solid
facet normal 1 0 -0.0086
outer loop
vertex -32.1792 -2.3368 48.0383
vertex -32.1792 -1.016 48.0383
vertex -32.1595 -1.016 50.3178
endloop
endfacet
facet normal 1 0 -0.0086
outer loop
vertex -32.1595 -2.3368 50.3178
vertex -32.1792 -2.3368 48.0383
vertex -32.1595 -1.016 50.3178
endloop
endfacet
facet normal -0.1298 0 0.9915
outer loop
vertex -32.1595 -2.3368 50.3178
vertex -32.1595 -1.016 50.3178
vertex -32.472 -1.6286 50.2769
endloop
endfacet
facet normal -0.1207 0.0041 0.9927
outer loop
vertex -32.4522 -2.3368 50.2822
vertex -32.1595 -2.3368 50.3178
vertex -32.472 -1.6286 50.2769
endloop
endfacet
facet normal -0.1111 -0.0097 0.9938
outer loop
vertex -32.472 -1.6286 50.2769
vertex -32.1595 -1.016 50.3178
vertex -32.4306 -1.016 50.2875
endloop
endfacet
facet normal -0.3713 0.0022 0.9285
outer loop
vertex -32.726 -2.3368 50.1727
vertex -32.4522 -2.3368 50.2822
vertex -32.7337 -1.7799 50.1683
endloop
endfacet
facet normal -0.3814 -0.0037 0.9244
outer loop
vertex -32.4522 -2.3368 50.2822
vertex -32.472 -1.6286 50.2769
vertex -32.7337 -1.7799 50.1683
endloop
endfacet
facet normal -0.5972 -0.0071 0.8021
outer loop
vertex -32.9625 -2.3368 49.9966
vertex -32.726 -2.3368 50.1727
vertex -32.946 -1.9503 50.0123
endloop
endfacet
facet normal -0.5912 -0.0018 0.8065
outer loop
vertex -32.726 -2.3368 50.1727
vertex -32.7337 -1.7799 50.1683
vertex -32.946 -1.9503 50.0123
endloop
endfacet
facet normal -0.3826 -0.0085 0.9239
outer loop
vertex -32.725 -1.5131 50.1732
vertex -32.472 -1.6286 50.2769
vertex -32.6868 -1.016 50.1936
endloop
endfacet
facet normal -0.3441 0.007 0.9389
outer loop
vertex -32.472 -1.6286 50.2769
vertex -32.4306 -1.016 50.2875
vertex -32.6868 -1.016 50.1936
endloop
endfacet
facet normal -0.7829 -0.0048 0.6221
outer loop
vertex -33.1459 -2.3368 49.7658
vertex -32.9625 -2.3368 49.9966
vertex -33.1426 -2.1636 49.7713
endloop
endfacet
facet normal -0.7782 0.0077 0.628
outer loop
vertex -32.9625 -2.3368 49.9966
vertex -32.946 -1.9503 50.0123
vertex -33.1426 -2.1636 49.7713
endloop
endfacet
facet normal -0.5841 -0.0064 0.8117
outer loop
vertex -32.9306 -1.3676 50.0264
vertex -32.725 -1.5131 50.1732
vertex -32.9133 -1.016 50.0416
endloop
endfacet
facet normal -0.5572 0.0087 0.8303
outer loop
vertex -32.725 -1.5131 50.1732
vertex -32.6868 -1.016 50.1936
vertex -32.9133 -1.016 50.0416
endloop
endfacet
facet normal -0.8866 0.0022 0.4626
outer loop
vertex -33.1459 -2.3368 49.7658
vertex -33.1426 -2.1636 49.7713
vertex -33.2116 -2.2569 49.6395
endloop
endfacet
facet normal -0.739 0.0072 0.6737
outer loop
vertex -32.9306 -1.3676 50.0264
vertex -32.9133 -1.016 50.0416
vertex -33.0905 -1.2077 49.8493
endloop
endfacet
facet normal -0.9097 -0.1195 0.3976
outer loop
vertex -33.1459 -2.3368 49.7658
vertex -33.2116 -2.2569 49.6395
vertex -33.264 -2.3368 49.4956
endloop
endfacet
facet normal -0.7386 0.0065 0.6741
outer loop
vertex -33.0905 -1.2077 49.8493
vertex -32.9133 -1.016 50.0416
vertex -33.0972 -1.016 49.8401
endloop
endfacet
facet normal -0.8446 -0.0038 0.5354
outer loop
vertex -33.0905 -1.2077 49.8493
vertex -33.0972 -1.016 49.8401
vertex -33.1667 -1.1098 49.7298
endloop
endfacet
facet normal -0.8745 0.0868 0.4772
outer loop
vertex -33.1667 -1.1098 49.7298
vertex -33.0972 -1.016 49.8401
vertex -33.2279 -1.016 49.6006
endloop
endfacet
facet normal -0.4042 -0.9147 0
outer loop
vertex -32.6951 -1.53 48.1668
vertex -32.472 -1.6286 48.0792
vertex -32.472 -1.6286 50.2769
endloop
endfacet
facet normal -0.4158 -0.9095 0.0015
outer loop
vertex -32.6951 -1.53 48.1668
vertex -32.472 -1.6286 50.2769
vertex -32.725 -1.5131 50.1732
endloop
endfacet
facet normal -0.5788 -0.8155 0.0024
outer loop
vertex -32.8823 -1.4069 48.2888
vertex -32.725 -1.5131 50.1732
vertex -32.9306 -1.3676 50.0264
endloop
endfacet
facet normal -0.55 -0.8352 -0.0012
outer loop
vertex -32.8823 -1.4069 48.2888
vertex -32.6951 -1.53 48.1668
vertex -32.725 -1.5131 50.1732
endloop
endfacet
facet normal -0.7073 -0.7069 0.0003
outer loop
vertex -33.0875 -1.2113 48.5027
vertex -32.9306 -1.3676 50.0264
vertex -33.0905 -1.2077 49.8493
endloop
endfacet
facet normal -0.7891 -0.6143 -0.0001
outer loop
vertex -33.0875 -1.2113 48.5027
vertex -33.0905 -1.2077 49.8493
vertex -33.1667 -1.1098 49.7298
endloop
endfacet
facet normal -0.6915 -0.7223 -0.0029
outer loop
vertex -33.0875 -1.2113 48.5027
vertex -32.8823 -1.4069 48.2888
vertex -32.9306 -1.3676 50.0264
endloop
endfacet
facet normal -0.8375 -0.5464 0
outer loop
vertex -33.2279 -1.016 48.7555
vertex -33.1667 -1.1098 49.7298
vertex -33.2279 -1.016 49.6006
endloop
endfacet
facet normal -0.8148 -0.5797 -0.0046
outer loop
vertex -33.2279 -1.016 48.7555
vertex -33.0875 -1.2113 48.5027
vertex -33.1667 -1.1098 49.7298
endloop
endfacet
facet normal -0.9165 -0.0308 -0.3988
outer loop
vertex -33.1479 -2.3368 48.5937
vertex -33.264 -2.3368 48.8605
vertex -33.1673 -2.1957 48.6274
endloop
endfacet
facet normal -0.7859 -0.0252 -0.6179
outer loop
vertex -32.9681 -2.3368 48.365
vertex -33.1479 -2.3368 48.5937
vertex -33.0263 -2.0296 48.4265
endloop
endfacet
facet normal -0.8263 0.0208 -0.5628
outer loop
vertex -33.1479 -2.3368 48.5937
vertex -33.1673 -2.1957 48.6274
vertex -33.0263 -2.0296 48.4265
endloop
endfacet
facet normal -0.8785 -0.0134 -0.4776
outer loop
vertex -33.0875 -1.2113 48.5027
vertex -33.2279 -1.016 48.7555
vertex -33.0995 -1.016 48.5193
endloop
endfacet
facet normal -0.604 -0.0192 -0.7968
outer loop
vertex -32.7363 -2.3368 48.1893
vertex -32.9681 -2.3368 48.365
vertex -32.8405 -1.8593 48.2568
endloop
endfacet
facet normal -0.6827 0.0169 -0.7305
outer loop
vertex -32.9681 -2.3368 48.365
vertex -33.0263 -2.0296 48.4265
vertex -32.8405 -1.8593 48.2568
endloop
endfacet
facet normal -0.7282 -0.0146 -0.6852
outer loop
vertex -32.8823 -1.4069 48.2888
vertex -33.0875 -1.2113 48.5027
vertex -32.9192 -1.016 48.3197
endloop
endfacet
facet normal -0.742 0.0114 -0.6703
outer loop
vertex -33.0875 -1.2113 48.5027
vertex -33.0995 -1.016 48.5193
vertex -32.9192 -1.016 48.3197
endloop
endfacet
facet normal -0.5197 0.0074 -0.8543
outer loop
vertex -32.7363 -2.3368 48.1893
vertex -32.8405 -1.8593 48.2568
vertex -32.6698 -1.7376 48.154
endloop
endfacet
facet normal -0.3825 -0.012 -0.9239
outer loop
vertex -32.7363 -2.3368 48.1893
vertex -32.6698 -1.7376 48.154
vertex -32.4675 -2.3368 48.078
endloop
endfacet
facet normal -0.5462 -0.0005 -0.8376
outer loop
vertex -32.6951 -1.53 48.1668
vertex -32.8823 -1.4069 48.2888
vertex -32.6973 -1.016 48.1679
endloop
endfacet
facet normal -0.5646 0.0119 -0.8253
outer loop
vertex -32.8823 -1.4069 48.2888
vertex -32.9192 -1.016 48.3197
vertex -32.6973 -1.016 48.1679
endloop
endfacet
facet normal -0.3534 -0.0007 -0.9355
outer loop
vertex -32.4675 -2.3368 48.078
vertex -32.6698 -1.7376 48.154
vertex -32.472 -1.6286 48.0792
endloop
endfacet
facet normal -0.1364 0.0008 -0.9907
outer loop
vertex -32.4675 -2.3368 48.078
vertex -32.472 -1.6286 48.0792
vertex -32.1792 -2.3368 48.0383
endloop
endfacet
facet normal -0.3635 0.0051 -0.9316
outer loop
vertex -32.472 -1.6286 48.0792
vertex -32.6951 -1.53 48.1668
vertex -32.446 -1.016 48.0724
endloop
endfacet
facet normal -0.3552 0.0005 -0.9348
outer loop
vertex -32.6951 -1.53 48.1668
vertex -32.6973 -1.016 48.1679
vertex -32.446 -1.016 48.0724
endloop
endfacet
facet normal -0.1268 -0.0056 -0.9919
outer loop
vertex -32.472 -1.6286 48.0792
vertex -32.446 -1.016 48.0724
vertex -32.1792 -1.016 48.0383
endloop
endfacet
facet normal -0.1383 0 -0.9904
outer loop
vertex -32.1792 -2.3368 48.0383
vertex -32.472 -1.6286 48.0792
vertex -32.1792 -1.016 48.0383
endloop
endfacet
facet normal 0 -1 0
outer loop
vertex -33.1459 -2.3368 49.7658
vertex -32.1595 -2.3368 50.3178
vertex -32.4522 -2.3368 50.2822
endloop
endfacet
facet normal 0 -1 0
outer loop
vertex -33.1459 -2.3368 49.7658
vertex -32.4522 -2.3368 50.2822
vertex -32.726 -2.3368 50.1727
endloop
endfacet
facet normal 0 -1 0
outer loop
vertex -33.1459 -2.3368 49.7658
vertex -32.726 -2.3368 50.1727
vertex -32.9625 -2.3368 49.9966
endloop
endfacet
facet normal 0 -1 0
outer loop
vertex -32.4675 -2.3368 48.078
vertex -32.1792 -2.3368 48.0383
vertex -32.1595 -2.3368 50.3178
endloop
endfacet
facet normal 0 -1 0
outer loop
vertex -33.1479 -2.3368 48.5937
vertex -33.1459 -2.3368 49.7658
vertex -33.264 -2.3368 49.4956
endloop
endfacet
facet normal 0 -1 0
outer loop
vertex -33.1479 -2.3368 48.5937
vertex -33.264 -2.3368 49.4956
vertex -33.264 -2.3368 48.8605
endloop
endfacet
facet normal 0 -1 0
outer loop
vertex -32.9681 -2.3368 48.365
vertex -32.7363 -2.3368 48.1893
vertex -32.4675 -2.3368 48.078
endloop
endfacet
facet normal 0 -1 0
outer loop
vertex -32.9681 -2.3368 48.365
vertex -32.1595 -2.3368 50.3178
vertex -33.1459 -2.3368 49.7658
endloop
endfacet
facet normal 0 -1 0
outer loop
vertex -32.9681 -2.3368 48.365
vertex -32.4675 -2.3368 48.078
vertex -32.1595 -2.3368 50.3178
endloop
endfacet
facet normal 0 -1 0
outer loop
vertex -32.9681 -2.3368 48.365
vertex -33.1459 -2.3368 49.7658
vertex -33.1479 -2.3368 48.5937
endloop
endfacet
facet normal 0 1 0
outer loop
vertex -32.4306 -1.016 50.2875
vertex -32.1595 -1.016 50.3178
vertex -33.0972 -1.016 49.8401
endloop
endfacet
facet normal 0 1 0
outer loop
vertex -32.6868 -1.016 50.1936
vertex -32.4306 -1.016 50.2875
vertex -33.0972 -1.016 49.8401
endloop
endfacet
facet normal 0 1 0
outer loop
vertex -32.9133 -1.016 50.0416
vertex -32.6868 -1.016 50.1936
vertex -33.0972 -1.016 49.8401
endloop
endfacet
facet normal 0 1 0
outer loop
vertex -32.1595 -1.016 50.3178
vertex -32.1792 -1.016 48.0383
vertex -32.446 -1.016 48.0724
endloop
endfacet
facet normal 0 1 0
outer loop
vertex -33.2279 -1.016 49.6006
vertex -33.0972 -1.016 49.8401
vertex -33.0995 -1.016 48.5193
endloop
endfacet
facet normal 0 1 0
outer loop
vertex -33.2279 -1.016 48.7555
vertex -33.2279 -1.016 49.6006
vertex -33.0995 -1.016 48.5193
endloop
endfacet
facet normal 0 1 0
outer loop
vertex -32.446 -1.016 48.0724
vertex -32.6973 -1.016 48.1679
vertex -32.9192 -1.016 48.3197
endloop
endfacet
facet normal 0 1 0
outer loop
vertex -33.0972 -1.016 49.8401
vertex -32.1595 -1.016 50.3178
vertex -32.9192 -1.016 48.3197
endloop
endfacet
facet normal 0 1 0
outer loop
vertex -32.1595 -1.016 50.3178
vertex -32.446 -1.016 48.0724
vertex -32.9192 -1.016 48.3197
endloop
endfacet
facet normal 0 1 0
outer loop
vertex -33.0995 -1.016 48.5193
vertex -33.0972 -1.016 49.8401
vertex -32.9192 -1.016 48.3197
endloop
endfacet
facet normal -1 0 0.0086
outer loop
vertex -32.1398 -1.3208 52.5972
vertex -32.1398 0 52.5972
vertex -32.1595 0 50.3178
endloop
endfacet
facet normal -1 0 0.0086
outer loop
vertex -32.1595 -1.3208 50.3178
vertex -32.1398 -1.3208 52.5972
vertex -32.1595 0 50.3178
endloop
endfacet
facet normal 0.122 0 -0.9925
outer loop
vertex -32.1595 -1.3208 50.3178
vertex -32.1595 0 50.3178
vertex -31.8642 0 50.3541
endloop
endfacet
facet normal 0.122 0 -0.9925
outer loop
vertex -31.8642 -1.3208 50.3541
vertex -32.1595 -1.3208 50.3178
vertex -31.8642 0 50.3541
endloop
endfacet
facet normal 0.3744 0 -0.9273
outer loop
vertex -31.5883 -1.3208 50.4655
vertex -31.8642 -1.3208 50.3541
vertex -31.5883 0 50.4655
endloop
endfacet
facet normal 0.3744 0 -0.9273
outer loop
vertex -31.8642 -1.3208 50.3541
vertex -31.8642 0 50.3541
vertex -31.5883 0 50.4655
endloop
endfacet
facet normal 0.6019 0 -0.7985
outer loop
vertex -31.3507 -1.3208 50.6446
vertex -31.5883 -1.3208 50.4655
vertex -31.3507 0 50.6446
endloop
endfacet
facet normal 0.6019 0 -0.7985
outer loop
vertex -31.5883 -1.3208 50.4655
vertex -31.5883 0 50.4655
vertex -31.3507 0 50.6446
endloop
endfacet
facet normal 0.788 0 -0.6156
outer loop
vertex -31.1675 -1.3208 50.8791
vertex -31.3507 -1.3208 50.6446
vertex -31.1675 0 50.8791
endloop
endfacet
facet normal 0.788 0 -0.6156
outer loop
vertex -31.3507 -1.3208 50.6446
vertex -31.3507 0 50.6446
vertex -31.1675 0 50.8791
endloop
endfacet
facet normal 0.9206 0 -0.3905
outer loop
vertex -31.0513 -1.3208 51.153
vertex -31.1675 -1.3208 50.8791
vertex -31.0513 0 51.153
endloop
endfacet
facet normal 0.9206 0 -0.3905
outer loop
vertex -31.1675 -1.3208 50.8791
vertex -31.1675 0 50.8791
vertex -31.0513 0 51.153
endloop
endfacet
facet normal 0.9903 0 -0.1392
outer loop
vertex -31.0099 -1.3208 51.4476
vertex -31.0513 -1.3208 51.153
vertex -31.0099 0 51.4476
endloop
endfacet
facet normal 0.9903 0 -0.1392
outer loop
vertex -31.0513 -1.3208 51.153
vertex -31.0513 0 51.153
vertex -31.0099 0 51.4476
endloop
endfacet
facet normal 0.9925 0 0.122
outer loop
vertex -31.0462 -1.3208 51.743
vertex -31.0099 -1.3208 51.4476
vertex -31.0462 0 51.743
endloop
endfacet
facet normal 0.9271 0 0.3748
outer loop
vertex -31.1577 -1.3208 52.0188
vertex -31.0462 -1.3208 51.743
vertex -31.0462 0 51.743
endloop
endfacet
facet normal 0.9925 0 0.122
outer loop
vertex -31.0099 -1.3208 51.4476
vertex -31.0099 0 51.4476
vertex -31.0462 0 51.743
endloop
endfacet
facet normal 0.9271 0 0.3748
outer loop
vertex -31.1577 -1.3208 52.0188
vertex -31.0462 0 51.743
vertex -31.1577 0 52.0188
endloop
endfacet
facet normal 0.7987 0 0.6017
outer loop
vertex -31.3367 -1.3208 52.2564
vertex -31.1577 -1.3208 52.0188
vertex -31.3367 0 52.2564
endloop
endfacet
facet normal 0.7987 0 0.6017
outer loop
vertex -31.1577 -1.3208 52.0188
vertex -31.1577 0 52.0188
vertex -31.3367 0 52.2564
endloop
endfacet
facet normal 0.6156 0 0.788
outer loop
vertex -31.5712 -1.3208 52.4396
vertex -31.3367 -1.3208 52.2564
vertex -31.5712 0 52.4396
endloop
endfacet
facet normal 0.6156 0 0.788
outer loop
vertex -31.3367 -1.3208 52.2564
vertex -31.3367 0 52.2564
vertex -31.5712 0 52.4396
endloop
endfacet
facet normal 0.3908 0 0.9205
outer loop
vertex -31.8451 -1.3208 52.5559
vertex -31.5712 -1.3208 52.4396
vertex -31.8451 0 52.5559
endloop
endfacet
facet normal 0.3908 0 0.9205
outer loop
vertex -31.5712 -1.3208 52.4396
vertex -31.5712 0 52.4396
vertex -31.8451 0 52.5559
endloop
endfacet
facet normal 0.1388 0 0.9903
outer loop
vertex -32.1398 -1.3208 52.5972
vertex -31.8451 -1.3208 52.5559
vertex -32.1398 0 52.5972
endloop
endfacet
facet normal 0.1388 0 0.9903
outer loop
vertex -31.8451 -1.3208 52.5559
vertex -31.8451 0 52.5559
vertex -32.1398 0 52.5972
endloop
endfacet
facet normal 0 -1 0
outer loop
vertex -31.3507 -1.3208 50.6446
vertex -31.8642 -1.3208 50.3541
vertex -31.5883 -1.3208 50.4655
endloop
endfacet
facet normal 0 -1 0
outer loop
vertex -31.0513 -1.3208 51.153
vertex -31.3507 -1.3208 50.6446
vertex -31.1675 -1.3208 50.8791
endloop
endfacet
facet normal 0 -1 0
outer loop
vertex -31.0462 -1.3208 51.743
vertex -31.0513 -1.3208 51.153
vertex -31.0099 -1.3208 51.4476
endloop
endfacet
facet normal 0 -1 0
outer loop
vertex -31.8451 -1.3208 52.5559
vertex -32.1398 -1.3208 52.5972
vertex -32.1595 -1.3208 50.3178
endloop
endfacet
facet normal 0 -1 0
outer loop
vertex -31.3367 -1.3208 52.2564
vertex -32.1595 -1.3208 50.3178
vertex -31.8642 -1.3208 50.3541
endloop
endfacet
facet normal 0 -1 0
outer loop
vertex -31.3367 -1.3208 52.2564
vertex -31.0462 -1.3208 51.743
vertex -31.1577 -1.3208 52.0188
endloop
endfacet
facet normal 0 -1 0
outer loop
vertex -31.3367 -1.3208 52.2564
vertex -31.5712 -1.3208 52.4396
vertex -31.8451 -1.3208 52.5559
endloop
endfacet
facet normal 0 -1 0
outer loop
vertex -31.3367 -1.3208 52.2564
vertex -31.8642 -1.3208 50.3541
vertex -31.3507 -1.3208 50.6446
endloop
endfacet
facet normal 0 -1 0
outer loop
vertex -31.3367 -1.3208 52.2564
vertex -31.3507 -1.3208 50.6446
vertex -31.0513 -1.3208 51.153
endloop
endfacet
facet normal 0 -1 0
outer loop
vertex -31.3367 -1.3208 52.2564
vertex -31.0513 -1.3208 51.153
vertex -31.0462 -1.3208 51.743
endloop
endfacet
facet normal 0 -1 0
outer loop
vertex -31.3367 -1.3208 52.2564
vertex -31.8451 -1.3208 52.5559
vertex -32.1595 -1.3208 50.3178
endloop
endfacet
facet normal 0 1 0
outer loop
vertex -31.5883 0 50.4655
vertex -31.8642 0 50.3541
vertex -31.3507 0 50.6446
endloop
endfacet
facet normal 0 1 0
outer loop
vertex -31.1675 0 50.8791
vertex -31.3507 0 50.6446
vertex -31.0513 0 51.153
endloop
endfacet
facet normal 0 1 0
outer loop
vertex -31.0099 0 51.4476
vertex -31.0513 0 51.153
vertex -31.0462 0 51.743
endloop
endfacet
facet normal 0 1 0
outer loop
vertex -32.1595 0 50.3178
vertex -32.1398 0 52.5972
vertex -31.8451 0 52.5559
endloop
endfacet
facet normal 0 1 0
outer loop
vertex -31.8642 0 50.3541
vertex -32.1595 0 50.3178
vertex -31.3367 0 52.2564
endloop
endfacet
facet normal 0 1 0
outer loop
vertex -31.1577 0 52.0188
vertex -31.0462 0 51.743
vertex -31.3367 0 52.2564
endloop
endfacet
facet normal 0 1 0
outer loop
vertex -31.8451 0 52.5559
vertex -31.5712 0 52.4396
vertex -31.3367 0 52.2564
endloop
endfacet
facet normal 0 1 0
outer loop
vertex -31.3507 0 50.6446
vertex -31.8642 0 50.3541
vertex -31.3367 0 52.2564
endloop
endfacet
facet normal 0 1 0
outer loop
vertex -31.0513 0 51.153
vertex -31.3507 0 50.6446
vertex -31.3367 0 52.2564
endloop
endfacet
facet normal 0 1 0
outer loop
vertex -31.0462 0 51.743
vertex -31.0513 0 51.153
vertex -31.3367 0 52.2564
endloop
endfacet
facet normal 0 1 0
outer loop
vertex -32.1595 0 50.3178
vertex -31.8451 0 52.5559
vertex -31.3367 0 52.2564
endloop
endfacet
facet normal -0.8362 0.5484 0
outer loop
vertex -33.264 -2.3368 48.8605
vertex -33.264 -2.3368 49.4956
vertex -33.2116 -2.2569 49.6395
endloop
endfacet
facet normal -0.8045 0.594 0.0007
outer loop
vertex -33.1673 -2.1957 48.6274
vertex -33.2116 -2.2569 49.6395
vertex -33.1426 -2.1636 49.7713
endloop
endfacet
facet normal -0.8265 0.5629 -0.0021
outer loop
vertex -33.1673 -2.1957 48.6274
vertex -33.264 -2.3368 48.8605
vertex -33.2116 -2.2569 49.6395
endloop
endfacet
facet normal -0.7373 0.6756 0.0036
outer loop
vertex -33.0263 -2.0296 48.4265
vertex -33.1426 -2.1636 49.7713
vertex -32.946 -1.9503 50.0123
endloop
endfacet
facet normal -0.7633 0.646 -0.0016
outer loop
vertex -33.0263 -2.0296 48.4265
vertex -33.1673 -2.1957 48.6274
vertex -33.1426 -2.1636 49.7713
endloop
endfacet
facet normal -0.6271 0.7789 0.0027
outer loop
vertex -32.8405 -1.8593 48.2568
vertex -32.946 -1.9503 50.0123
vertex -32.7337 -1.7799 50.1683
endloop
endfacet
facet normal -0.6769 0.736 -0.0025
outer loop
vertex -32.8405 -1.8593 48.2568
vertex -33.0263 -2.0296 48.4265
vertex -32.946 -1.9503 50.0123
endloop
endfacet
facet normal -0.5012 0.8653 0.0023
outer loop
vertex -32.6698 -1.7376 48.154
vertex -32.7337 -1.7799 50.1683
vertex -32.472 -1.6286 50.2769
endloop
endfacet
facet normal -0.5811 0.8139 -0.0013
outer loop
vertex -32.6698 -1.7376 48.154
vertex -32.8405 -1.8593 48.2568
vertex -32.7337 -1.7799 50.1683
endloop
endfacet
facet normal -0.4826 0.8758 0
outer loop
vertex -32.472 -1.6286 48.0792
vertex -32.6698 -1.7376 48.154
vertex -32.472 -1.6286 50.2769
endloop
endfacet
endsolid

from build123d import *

# Parameters (mm, degrees)
F1_DEPTH = 1.3208
F2_ANGLE = 180
F5_DEPTH = 101.6


with BuildPart() as f1:
    # F0 (on Front) → F1 (new body)
    with BuildSketch(Plane.XZ):
        with BuildLine():
            Line((-32.139756, 52.597248), (-32.1595, 50.31779))
            ThreePointArc((-32.1595, 50.31779), (-31.009899, 51.447647), (-32.139756, 52.597248))
        make_face()
    extrude(amount=F1_DEPTH)


with BuildPart() as f2_1:
    # F2: copy of F1
    add(f1.part.rotate(Axis((-32.1595, -0.6604, 50.31779), (0, -1, 0)), F2_ANGLE))


with BuildPart() as f2_1_1:
    # F3: moved
    add(f2_1.part.moved(Location((0, -1.016, 0))))

    # F4 (on Top) → F5 (cut)
    with BuildSketch(Plane.XY):
        with BuildLine():
            ThreePointArc((-32.472003, -1.62864), (-33.012517, -1.292109), (-33.350453, -0.752472))
            Line((-33.350453, -0.752472), (-33.350453, -2.492071))
            ThreePointArc((-33.350453, -2.492071), (-32.983826, -1.986495), (-32.472003, -1.62864))
        make_face()
    extrude(amount=F5_DEPTH, mode=Mode.SUBTRACT)


solid = Compound([f1.part, f2_1_1.part])
